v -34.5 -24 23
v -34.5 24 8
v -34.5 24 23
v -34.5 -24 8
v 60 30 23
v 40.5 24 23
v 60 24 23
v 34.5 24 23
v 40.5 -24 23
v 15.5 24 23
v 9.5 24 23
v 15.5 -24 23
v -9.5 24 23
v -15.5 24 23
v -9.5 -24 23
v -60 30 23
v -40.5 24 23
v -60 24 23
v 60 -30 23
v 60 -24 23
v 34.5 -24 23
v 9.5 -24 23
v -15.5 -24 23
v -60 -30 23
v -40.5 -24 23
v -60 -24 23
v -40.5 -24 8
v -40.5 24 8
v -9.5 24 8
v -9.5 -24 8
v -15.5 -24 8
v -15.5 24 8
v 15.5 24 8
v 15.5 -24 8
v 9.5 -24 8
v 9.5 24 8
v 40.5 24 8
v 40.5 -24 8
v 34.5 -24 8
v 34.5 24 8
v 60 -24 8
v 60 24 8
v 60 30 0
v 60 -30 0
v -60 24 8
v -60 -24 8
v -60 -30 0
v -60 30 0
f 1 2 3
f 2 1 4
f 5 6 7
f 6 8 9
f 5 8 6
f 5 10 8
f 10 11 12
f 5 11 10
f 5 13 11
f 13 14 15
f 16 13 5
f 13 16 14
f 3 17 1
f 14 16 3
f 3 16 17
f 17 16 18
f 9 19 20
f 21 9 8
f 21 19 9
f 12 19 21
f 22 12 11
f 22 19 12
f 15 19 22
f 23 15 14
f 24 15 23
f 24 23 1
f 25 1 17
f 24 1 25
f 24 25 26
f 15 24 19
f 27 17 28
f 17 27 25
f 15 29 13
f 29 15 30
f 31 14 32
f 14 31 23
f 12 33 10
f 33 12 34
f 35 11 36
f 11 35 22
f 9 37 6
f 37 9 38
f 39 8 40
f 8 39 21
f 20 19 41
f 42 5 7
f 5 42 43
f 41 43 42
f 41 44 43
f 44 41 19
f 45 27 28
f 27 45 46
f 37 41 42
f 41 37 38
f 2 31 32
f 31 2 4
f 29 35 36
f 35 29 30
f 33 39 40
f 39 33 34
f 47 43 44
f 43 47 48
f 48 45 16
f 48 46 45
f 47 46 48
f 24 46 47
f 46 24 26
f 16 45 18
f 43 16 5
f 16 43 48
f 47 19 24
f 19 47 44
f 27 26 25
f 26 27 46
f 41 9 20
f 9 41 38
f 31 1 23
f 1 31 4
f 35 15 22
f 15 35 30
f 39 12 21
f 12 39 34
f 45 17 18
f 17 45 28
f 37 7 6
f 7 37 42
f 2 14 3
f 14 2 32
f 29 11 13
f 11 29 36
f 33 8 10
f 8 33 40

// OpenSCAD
$fn = 32;

// ----------------------------------------------------------------------
// Rib frame 120 x 60 x 23
// 4 ribs at 25 mm pitch
// ----------------------------------------------------------------------

// --- parameters (mm) ---
frame = [120, 60, 8];  // base plate size (x, y, z)
seat_tol = 0.1;        // tolerance at the seating features
free_tol = 0.5;        // general tolerance on the free sizes
rail_w = 6;            // side rail width
ribs = 4;              // number of ribs
rib_t = 6;             // rib thickness
rib_h = 15;            // rib height above the base plate
pitch = 25;            // pitch between rib centres

// --- derived feature positions (mm) ---
span = (ribs - 1) * pitch;          // = 75   distance between the outer ribs
origin_x = -span / 2;               // = -37.5   X of the first rib
rib_len = frame[1] - 2 * rail_w + 2;  // = 50   rib length, 1 mm into each rail
feature_centers = [
  [origin_x + 0 * pitch, 0],
  [origin_x + 1 * pitch, 0],
  [origin_x + 2 * pitch, 0],
  [origin_x + 3 * pitch, 0]
];   // rib centre line, drives the rib loop

// base plate, two side rails, then the ribs read straight off feature_centers
union() {
  translate([-frame[0] / 2, -frame[1] / 2, 0]) cube(frame);
  translate([-frame[0] / 2, -frame[1] / 2, 0]) cube([frame[0], rail_w, frame[2] + rib_h]);
  translate([-frame[0] / 2, frame[1] / 2 - rail_w, 0]) cube([frame[0], rail_w, frame[2] + rib_h]);
  for (centre = feature_centers)
    translate([centre[0] - rib_t / 2, centre[1] - rib_len / 2, frame[2] - 1])
      cube([rib_t, rib_len, rib_h + 1]);
}
